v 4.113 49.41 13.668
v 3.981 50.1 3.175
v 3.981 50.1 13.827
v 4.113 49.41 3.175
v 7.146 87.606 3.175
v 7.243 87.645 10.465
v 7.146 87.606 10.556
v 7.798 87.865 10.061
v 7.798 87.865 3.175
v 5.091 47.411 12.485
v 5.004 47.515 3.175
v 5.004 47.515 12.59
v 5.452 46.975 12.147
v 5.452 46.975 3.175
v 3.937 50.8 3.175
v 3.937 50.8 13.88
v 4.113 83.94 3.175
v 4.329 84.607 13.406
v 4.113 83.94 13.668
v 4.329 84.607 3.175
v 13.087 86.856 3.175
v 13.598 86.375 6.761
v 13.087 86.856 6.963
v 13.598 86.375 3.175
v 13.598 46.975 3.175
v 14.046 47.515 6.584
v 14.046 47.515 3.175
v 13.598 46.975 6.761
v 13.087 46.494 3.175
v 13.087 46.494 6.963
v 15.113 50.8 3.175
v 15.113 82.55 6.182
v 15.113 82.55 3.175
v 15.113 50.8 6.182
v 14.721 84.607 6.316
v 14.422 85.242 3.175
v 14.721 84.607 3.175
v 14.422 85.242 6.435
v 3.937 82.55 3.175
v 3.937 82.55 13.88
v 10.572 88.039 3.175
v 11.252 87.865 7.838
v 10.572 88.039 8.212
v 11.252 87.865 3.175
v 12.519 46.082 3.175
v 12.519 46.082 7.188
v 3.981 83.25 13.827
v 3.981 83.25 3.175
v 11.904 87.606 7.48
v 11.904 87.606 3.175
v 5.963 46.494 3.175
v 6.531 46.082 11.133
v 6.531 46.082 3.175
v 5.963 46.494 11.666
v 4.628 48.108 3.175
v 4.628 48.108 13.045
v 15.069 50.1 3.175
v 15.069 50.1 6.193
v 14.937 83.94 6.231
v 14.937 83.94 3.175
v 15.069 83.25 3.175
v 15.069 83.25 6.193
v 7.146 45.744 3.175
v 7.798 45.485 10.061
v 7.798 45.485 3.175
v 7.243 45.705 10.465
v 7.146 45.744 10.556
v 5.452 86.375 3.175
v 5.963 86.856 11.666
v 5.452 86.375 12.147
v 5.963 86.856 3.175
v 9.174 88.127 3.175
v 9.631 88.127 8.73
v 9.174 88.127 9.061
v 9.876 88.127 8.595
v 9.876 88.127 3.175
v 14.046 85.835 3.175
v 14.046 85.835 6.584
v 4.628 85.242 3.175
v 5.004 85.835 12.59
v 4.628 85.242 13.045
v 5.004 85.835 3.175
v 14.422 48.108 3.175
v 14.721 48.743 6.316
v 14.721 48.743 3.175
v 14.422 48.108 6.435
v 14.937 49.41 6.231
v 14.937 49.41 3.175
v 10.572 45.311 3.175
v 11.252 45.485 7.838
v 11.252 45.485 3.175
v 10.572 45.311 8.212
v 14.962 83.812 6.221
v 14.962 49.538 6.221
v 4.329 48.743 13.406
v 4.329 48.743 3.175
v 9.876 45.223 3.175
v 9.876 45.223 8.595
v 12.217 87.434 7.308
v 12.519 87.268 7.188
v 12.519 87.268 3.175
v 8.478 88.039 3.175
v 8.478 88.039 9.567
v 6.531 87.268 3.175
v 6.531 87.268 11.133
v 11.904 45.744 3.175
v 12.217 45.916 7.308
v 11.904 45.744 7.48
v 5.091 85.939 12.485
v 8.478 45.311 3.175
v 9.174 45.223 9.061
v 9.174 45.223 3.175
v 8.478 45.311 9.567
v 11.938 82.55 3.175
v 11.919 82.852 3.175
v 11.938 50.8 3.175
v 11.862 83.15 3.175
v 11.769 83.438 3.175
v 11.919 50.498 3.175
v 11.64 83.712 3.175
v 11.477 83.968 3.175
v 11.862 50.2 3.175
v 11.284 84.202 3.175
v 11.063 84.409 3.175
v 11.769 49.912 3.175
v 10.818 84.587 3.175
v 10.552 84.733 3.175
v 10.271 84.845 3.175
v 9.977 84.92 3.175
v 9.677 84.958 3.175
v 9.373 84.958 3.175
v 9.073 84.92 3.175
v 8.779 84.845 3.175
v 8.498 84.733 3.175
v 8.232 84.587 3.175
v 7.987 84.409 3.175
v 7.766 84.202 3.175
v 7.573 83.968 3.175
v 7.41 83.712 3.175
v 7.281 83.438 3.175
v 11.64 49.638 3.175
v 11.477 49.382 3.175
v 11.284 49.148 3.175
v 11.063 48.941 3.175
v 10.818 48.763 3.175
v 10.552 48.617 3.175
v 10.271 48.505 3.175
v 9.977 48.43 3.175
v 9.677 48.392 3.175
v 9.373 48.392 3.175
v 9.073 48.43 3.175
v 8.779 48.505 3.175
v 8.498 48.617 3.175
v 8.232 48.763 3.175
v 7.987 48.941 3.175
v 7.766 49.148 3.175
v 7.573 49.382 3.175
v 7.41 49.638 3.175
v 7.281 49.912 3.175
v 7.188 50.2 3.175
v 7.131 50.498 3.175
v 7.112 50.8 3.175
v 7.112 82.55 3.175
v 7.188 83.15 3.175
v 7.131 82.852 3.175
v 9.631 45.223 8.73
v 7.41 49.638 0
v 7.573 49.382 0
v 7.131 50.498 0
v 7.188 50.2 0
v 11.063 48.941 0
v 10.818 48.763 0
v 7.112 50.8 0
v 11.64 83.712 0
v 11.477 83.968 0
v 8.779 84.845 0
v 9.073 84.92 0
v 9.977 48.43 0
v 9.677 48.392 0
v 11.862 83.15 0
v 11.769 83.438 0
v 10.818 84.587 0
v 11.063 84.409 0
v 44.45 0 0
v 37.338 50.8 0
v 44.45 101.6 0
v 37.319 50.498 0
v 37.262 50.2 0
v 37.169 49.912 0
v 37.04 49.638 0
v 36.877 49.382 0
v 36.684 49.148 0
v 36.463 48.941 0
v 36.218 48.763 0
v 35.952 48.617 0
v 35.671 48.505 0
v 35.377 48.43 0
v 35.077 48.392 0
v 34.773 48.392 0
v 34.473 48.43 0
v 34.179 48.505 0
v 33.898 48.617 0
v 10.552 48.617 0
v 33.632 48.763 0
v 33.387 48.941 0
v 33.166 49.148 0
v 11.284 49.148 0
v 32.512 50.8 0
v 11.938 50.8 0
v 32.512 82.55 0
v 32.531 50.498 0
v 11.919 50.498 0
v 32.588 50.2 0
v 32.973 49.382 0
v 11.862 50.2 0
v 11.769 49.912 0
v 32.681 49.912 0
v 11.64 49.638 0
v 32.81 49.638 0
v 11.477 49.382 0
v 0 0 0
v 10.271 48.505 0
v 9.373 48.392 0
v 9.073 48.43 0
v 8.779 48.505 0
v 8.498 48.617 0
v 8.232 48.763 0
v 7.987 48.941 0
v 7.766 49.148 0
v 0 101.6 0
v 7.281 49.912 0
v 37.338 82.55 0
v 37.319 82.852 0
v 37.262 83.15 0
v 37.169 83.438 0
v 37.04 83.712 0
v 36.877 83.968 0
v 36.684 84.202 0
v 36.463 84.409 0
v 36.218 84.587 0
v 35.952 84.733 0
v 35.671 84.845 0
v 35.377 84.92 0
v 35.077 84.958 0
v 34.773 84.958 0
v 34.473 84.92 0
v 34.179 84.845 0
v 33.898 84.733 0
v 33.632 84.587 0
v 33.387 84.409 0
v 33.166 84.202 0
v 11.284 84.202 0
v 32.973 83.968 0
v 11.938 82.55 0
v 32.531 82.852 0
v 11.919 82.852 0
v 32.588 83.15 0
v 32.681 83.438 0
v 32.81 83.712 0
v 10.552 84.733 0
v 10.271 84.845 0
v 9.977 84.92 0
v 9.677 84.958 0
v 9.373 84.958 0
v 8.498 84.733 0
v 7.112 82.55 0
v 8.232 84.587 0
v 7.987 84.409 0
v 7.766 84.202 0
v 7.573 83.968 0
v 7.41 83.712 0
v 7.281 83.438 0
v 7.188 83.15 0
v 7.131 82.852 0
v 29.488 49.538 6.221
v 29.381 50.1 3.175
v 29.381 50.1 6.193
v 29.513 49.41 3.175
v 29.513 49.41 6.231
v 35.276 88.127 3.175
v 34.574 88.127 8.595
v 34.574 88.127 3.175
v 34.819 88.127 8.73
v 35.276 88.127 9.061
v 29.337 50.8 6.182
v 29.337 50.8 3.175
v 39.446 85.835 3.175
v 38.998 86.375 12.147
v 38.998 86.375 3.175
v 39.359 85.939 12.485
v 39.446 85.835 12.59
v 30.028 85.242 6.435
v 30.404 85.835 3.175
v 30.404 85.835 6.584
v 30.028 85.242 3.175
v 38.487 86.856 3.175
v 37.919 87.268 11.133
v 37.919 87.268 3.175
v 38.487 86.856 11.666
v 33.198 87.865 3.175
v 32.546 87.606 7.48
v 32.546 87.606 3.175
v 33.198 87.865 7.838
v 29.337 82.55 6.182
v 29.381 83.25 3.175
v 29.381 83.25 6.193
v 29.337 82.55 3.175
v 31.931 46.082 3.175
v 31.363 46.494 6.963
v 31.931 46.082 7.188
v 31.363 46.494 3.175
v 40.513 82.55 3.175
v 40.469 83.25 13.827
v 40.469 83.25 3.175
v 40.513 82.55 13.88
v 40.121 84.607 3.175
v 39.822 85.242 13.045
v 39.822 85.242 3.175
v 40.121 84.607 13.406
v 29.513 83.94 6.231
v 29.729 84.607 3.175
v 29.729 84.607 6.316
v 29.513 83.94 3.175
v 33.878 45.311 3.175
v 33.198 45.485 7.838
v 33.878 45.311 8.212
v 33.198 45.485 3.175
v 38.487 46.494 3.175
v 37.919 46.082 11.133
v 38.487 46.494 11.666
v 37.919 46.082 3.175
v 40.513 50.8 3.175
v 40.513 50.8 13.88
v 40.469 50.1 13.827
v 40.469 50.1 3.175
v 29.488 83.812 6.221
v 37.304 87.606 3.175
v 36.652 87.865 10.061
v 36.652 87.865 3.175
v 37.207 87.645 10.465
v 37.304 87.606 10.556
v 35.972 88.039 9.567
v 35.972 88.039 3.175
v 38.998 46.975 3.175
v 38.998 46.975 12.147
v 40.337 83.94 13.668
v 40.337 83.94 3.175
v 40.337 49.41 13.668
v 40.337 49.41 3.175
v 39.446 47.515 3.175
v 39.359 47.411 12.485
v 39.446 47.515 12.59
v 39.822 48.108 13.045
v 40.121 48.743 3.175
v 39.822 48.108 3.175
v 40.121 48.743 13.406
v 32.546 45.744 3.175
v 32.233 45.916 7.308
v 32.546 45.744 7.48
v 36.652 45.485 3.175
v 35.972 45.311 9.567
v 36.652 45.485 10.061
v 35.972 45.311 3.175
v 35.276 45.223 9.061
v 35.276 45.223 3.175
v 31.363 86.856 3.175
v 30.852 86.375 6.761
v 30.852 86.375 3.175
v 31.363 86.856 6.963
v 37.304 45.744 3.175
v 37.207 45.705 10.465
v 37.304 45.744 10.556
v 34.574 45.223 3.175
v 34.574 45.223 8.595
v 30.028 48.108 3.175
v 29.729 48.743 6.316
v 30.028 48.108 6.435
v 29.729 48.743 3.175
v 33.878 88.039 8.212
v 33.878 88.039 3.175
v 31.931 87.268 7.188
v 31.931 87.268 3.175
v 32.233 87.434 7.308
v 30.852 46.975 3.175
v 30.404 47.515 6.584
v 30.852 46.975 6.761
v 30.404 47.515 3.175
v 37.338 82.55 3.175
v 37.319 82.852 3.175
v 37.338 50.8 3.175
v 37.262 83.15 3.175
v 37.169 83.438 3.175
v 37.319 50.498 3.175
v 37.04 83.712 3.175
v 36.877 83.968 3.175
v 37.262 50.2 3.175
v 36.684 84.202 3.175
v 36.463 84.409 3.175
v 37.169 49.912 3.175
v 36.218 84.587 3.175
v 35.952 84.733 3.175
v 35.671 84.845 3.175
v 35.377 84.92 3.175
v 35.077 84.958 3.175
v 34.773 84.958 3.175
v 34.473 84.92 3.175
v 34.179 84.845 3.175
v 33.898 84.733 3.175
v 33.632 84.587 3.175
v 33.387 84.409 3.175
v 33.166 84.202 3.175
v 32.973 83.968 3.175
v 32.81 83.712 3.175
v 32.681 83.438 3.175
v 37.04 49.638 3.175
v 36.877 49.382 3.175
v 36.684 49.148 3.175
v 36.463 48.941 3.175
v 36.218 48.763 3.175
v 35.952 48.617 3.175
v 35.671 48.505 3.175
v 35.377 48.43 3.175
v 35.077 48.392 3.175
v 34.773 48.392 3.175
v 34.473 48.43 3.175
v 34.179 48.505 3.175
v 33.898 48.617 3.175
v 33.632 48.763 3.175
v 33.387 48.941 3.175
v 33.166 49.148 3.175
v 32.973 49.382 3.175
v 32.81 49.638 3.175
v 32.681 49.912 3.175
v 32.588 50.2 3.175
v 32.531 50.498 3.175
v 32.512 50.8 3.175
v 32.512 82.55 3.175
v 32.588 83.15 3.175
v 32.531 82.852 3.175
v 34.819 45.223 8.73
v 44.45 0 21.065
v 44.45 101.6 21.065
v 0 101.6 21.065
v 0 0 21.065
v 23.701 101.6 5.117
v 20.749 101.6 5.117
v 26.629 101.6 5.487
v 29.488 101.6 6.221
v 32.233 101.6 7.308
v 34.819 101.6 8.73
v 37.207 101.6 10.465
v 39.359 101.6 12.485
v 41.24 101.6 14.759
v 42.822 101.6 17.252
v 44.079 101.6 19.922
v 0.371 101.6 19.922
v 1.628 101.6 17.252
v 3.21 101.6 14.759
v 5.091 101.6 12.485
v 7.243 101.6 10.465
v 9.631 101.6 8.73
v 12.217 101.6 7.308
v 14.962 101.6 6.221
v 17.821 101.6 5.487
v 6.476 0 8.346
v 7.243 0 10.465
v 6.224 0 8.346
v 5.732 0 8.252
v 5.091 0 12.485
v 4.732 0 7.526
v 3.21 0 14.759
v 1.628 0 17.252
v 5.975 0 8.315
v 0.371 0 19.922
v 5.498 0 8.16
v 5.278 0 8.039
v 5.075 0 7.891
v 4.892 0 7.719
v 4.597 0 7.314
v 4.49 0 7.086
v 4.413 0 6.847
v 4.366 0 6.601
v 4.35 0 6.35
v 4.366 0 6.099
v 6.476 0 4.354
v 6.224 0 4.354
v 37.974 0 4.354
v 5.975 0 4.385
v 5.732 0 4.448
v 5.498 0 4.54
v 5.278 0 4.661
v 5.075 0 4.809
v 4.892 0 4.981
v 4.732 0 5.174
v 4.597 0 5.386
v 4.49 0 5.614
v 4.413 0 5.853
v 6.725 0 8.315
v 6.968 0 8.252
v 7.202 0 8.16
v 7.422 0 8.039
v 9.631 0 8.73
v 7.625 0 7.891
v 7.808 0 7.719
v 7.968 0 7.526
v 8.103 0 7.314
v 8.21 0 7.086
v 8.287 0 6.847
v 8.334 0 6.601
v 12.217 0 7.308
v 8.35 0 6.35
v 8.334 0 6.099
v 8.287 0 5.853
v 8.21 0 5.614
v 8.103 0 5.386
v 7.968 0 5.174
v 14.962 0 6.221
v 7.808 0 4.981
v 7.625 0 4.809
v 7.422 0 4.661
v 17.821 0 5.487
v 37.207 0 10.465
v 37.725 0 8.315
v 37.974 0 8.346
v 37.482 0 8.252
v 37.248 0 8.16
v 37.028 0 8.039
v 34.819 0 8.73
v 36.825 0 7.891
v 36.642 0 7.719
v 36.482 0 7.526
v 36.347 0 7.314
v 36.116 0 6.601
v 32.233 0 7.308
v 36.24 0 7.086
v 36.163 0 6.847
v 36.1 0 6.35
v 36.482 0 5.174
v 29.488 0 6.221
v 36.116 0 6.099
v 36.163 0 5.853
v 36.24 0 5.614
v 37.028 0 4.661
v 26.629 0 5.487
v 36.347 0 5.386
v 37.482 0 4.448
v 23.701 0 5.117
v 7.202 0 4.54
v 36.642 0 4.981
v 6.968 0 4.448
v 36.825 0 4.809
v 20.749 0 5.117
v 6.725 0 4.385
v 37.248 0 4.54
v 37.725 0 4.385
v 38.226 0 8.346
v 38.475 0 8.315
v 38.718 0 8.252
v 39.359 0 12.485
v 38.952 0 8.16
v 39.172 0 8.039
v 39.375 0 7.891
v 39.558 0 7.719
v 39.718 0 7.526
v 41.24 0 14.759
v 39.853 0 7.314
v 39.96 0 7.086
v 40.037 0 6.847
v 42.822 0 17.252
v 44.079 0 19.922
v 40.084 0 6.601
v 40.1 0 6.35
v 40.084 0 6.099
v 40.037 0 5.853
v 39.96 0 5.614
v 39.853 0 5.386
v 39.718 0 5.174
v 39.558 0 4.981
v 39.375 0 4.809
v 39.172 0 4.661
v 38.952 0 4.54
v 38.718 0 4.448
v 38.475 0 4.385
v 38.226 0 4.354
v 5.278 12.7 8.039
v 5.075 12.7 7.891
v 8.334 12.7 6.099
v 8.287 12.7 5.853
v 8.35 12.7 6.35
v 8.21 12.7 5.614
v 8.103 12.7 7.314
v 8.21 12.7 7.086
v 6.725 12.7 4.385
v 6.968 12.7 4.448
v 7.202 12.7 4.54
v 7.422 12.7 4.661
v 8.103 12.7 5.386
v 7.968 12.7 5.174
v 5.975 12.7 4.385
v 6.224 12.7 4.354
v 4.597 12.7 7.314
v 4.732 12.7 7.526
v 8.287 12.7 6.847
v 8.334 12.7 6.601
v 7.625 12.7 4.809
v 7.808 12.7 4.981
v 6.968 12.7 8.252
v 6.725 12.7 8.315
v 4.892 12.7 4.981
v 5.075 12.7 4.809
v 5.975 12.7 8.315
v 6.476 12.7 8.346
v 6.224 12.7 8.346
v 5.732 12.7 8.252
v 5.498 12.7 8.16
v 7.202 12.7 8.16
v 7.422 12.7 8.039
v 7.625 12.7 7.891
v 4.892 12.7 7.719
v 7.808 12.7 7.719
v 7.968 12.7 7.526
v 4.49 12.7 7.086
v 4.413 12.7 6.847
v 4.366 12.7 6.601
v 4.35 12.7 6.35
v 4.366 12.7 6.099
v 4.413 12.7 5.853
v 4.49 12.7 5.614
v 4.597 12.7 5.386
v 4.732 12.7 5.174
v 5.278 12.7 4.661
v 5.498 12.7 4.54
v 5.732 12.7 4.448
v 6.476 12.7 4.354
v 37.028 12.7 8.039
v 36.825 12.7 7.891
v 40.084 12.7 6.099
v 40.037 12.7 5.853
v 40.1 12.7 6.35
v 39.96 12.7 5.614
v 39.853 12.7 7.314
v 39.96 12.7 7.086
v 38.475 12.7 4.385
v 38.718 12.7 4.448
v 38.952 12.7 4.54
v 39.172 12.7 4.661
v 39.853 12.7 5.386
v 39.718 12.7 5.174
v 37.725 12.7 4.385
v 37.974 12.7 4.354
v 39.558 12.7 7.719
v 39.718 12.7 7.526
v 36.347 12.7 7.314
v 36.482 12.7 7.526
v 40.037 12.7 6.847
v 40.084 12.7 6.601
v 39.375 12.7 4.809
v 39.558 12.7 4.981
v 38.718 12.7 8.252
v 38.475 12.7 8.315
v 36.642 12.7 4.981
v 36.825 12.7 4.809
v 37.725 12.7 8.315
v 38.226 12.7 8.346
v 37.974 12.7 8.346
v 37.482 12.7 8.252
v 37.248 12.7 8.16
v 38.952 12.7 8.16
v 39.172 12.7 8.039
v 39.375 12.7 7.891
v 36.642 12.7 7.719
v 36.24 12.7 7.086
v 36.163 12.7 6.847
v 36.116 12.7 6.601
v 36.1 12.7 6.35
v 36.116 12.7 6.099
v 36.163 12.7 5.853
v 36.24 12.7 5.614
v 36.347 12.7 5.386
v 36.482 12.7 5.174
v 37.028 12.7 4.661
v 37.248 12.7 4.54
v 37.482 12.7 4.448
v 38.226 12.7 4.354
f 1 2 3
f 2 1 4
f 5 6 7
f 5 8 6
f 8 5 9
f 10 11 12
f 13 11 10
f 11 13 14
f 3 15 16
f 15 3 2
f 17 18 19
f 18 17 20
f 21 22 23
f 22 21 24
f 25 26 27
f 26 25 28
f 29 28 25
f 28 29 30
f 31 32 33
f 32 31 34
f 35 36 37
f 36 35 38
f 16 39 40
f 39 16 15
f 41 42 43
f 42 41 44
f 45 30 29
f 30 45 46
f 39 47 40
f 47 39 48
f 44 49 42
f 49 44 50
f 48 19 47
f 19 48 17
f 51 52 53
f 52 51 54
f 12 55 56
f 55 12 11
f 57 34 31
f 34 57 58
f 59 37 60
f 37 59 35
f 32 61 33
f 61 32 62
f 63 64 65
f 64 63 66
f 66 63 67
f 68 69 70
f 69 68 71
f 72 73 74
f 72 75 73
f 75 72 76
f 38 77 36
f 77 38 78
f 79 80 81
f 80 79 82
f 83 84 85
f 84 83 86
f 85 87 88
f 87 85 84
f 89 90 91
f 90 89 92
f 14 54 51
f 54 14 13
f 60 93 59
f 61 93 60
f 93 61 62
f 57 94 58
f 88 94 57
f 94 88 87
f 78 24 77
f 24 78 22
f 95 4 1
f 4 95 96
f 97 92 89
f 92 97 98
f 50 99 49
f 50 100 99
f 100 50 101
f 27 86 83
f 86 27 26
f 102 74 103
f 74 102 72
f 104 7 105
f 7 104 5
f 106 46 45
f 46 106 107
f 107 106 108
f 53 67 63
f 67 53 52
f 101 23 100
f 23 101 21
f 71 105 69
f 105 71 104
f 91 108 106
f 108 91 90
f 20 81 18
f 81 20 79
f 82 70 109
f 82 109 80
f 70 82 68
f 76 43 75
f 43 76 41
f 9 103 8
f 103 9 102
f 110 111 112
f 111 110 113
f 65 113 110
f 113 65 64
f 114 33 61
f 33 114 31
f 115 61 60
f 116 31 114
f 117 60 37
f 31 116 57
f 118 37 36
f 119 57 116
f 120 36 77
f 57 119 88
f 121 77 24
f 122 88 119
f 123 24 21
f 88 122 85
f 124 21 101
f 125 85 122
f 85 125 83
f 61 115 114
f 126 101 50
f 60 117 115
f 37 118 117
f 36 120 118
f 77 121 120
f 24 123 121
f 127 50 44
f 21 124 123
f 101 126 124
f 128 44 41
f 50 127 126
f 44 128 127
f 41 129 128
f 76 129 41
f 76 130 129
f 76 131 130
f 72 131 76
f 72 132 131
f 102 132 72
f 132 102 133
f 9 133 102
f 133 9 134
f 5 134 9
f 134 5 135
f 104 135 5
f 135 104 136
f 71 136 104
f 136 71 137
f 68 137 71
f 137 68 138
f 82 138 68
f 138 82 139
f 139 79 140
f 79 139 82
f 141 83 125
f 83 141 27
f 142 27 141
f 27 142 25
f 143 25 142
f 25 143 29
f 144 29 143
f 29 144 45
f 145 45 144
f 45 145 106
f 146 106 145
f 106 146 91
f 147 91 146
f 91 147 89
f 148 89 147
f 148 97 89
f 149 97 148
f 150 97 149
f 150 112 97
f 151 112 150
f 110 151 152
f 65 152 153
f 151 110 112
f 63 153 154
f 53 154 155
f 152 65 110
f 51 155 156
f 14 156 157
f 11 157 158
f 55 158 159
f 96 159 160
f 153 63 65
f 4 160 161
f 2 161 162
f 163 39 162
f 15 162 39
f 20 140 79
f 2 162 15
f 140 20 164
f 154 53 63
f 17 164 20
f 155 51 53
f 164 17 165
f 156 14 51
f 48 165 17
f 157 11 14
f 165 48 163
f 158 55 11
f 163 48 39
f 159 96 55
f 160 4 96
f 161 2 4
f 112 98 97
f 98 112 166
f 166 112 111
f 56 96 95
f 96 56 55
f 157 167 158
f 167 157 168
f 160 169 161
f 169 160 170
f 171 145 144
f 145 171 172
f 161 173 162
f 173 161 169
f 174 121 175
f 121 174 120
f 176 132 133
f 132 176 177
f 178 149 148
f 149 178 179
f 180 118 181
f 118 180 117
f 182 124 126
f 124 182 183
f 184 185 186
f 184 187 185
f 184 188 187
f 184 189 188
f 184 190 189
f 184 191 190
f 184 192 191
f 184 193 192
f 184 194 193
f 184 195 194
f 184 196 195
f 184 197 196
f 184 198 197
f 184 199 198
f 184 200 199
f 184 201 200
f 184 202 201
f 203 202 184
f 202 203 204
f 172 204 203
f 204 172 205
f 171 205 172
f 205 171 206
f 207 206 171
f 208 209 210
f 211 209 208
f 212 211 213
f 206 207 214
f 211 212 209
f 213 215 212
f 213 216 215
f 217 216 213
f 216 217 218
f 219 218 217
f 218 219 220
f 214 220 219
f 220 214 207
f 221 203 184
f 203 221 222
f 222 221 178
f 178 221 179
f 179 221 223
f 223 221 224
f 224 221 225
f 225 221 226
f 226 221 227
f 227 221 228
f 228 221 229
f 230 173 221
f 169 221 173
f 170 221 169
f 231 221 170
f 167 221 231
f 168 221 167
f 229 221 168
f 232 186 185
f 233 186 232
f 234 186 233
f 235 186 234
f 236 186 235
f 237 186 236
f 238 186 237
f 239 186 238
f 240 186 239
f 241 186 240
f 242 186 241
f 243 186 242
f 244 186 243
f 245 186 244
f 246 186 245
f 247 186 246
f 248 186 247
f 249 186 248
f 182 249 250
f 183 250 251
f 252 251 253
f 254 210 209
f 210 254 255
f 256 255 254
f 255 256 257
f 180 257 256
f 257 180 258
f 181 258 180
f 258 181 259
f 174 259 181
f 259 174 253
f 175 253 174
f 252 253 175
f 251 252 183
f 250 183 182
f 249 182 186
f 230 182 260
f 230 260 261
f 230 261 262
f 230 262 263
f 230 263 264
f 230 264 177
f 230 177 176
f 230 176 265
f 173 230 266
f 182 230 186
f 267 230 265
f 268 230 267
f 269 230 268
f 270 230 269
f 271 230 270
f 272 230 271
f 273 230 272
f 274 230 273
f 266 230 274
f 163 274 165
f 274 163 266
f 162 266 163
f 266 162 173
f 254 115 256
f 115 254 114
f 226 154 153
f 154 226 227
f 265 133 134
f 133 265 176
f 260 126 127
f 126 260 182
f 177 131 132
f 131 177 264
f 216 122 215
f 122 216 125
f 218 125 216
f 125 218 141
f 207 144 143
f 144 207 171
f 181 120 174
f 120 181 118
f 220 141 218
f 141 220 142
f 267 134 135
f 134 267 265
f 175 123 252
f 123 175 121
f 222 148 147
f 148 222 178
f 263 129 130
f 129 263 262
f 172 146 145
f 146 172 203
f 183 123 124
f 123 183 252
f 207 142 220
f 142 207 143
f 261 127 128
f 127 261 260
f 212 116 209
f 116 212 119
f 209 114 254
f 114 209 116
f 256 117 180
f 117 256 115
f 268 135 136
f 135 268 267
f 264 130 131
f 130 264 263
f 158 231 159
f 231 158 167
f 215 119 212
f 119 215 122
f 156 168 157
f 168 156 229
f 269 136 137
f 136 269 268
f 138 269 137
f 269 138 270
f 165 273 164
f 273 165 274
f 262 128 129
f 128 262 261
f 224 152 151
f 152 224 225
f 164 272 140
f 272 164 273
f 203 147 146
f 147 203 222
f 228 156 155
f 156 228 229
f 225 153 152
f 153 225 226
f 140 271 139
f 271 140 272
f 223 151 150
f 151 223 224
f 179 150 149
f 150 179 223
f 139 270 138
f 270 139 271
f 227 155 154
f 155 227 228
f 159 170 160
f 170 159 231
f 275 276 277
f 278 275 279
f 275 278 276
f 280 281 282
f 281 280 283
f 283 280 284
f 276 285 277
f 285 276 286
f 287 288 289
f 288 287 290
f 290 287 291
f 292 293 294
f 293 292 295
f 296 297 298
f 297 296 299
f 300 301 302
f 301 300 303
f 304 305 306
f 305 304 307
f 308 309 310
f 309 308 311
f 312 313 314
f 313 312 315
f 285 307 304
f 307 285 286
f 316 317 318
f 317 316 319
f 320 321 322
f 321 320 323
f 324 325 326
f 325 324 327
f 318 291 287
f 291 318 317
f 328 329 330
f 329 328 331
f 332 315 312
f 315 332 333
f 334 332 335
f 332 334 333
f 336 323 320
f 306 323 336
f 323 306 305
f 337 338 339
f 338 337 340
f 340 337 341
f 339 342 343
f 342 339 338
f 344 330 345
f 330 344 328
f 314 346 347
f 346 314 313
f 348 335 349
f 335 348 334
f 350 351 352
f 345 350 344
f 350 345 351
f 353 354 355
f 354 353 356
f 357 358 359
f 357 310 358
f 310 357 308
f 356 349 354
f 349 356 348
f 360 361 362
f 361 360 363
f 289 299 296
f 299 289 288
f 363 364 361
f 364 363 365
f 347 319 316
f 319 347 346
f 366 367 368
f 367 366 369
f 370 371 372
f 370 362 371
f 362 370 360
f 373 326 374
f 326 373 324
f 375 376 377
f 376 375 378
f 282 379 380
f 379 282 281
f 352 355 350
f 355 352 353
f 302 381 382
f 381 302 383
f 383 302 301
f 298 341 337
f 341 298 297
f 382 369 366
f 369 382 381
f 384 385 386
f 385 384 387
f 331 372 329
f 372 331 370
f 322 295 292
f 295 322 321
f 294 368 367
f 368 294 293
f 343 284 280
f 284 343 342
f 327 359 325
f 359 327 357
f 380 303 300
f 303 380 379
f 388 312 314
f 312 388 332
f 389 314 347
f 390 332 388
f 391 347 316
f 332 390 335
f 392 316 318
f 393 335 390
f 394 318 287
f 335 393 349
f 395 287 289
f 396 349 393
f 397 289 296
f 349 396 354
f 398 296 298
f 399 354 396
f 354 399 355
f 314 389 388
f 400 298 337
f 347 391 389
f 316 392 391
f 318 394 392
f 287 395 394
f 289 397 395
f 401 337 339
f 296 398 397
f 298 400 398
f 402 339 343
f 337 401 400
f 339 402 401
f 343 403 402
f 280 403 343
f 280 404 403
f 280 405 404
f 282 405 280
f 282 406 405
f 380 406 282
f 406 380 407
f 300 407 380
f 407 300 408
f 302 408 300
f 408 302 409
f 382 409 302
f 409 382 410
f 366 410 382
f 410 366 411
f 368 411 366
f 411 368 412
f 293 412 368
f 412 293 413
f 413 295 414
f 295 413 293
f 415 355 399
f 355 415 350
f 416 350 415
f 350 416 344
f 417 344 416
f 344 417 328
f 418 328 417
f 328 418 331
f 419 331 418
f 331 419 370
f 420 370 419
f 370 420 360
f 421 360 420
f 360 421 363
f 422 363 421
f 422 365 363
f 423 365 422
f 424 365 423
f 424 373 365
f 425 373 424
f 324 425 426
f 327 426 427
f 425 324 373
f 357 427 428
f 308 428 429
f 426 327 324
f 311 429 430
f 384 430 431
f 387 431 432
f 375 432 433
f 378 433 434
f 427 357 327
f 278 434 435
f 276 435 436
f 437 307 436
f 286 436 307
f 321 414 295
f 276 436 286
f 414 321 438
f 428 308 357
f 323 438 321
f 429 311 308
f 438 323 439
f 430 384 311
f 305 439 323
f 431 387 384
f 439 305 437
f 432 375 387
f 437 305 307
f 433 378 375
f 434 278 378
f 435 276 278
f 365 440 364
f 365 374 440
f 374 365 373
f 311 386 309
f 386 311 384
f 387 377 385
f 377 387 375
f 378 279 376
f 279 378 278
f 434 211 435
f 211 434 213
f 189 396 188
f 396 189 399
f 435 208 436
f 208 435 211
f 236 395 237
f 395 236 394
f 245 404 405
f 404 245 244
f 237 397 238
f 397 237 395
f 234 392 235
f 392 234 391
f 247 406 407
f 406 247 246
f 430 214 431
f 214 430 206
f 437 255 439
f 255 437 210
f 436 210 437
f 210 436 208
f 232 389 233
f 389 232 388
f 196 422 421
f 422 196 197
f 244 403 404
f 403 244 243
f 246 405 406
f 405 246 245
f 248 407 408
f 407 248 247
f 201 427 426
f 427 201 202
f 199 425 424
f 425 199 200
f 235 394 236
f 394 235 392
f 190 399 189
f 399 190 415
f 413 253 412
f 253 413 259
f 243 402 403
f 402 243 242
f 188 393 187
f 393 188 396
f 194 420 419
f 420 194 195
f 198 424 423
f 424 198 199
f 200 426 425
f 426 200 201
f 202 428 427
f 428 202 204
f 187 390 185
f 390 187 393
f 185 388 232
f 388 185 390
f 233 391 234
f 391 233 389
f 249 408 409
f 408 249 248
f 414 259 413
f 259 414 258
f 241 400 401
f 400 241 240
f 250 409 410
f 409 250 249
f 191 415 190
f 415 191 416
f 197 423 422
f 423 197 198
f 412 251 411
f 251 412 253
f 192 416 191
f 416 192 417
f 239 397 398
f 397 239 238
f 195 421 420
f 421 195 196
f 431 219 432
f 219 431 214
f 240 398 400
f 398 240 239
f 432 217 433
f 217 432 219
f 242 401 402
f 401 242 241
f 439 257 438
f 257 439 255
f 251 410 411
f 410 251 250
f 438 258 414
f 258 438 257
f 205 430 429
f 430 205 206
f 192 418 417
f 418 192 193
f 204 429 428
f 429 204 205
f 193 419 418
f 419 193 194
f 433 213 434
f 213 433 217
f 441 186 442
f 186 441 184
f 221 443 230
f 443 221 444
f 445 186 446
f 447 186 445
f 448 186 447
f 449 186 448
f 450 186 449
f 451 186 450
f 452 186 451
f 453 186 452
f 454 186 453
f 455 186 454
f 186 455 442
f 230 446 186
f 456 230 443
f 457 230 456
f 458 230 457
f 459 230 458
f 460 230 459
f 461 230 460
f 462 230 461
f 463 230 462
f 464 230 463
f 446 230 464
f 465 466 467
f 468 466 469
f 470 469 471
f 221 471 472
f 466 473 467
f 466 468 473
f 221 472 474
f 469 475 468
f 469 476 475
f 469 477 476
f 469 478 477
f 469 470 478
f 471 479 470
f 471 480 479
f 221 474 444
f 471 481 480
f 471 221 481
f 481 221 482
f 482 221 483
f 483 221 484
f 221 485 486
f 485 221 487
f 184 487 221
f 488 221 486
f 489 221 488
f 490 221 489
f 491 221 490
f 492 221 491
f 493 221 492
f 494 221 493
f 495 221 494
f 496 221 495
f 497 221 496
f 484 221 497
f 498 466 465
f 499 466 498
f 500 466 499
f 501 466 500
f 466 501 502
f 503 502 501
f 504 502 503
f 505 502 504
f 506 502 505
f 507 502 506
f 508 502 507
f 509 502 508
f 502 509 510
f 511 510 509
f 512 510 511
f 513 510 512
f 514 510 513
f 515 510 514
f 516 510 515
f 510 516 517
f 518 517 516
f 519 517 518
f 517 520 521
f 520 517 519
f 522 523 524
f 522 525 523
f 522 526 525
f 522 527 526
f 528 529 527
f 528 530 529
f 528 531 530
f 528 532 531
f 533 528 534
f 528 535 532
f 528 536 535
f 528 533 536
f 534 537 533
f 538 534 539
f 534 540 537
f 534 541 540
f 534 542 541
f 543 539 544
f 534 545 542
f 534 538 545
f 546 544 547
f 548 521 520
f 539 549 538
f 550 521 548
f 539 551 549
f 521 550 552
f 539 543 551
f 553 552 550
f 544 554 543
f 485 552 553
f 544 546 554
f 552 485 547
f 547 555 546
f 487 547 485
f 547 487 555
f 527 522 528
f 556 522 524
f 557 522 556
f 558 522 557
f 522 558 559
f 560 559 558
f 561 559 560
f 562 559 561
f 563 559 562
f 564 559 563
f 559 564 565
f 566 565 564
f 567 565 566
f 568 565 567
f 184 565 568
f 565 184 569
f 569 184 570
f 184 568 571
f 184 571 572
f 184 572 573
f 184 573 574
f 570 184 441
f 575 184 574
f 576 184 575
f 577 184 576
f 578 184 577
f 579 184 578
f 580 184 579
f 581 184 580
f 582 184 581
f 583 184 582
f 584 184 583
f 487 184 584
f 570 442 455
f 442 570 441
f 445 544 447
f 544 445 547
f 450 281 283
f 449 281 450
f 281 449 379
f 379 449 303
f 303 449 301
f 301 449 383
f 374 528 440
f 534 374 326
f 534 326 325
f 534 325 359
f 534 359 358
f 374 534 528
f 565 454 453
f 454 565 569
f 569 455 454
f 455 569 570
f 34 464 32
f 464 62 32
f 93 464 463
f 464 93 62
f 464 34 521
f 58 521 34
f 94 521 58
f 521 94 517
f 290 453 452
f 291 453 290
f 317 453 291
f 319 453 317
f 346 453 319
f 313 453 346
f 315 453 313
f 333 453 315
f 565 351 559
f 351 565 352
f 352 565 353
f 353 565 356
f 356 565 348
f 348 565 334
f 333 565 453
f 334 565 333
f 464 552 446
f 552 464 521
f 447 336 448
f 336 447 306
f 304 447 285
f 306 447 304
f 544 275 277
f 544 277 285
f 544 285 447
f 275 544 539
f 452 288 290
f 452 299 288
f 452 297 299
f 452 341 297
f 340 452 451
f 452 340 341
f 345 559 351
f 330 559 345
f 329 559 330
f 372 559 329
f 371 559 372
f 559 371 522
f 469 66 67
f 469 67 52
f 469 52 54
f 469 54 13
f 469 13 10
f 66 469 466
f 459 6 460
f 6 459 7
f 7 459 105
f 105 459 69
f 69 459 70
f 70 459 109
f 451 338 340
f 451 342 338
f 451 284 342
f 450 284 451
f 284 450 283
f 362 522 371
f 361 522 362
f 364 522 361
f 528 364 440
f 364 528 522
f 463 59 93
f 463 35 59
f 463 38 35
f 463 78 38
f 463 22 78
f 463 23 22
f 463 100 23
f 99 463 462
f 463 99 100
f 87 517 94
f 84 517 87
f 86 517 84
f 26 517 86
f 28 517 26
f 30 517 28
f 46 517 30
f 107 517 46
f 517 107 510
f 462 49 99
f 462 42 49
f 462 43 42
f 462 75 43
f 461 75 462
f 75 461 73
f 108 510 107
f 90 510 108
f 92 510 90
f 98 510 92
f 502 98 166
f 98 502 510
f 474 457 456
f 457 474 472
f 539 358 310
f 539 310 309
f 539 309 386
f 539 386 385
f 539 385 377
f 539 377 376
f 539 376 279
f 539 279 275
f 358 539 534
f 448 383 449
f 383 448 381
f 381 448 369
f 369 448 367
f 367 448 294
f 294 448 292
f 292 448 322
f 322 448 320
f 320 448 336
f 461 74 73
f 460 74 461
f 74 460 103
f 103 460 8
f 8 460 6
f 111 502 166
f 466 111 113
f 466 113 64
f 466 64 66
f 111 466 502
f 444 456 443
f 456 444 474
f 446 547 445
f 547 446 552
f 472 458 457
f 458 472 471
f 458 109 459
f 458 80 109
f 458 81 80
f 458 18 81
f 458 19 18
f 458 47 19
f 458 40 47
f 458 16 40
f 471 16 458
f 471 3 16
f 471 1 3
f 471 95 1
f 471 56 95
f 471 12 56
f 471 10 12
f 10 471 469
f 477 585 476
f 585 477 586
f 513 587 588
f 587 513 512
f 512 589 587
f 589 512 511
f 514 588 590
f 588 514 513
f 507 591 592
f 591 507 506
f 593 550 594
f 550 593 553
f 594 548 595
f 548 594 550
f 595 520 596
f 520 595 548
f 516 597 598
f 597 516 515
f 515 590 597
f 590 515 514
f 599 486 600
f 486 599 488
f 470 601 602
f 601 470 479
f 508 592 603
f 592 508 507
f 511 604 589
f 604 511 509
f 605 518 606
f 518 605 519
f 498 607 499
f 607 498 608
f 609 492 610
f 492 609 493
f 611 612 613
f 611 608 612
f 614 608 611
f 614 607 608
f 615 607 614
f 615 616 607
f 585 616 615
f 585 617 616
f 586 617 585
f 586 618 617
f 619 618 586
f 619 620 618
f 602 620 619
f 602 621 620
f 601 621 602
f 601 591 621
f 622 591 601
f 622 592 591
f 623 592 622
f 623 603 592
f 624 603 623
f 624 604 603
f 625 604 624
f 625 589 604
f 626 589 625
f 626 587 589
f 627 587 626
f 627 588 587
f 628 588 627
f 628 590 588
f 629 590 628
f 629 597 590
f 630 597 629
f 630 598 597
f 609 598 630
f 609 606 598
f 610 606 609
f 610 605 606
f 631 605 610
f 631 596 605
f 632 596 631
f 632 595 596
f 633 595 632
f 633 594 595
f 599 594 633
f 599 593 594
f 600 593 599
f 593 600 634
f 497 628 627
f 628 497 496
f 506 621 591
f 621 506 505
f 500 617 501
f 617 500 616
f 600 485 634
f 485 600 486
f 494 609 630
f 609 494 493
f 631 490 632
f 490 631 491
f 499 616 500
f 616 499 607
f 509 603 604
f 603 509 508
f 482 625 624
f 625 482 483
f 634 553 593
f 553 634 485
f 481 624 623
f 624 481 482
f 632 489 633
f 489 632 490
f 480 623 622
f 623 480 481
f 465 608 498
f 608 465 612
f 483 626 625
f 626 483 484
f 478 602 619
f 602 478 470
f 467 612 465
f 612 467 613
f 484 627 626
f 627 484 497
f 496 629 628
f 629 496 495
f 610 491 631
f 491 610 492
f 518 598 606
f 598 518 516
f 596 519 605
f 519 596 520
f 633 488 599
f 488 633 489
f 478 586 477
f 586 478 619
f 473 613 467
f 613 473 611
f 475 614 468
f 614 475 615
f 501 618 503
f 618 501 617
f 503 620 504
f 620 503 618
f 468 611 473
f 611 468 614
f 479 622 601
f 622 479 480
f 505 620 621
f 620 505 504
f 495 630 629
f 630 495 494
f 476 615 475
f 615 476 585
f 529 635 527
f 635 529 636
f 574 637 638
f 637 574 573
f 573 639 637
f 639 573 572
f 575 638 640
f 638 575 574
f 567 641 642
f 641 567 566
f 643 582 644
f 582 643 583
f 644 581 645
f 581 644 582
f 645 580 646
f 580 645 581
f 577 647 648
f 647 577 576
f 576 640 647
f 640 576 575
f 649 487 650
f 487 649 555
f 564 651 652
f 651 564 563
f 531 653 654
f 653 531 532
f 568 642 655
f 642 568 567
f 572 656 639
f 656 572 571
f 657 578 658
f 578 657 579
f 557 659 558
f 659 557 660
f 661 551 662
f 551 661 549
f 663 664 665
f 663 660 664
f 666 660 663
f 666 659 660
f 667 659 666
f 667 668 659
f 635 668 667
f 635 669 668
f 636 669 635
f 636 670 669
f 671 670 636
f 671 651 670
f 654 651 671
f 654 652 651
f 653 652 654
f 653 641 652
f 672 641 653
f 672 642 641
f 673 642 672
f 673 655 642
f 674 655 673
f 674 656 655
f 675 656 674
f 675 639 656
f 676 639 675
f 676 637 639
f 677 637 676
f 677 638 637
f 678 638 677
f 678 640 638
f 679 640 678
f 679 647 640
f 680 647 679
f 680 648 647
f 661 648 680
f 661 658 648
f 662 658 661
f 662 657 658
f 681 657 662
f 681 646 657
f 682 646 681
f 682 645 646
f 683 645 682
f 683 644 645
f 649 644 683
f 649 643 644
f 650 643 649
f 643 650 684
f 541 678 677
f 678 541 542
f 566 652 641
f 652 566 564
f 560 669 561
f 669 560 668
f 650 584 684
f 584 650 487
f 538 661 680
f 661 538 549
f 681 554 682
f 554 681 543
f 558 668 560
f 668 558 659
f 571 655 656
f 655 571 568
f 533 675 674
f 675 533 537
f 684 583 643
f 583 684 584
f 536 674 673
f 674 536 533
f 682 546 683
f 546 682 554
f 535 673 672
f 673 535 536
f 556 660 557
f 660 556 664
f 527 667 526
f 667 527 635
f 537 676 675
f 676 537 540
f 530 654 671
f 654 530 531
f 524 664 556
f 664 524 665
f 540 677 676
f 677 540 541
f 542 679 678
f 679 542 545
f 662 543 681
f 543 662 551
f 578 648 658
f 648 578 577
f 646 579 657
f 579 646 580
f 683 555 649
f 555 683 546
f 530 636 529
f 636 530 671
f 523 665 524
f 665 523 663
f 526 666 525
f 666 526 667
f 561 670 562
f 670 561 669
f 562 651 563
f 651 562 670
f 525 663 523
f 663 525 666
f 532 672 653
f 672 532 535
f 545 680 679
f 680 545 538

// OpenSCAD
//mount for a andymark p71 gear box to fit in a 2"x2"x1/8"wall c-channel

in=25.4;
wbox=1.75*in;
lmotor=4*in;
face = 0;//0.25*in;
dmotor=1.772*in+2;
dshaft=1.15*in;  //large hole for the shaft surround
dholes=1.41*in; // diameter of mount holes in face
motorBoltDiam=4.5;  //diameter of the motor mount holes 
riser=in*1/4; //riser height
faceMountDiam = 4; //diameter of holes for mounting faceplate
faceMountDepth = face+0.5*in; //depth of holes for mounting faceplate.

module bolt_slots(inset=1*in, slot=1*in) {
        //bolt slots for mounting to c-channel
    bolt=0.19*in; //size of the bolt
    //#10 screw is 0.19in
    //#12 screw is 0.21in
    bolthead=0.44*in; //head size is .437", washer is .625"
    headheight=in*1/8;
    for (i=[-0.5*in, 0.5*in]) {
    translate([i+wbox/2, inset, riser-headheight]) 
        linear_extrude(h=wbox) {
            hull() {
                circle(d=bolthead);
                translate([0, slot]) circle(d=bolthead);
            }
        }
    translate([i+wbox/2, inset, 0]) 
        linear_extrude(h=riser) {
            hull() {
                circle(d=bolt);
                translate([0, slot]) circle(d=bolt);
            }
        }
    }

}


$fn=50;
*difference() {
    union() {
        #translate([-riser, 0, 0]) cube([riser, wbox, lmotor+face]);  //riser
        cube([wbox, wbox, lmotor+face]);  //faceplate plus upper sides
    }
        translate([wbox/2, 0, face]) cube([wbox/2, wbox, lmotor]); //remove upper extensions
        translate([wbox/2, wbox/2, face]) cylinder(d=dmotor, h=lmotor);
        translate([wbox/2, wbox/2, 0]) cylinder(d=dshaft, h=lmotor);
        for (i=[45, 135, 225, 315]) {
            translate([wbox/2, wbox/2, 0]) rotate([0, 0, i]) translate([dholes/2, 0, 0]) cylinder(d=4, h=lmotor);
        }
        for (i=[0.25*in, wbox-0.25*in]) {
            depth=wbox; //0.3*in;
            #translate([i, depth, face/2]) rotate([90, 0, 0]) cylinder(d=3, h=depth);
        }
}


difference() {
    cube([wbox, face+lmotor, riser+wbox]); 
    translate([0, face, wbox/2]) cube([wbox, lmotor, riser+wbox/2]); //remove the upper box half
    translate([wbox/2, face, riser+wbox/2]) rotate([-90, 0, 0]) cylinder(d=dmotor, h=lmotor); //make room for the motor
    translate([wbox/2, 0, riser+wbox/2]) rotate([-90, 0, 0]) cylinder(d=dshaft, h=face*2); //cut out the shaft hole
    for (i=[45, 135, 225, 315]) {
        translate([wbox/2, 0, riser+wbox/2]) rotate([-90, i, 0]) translate([dholes/2, 0, 0]) cylinder(d=motorBoltDiam, h=lmotor);
    }
    //faceplate base mount holes
    translate([0.25*in, 0, 0.25*in]) rotate([-90, 0, 0]) cylinder(d=faceMountDiam, h=faceMountDepth);
    translate([wbox-0.25*in, 0, 0.25*in]) rotate([-90, 0, 0]) cylinder(d=faceMountDiam, h=faceMountDepth);
    
    //original was 1.5 and 1
    //bolt_slots(inset=1.5*in, slot=1*in);
    bolt_slots(inset=2*in, slot=1.25*in);
    //bolt_slots(inset=lmotor-0.25*in, slot=0*in);
    inset=2*in;
    slot=1*in;
}
